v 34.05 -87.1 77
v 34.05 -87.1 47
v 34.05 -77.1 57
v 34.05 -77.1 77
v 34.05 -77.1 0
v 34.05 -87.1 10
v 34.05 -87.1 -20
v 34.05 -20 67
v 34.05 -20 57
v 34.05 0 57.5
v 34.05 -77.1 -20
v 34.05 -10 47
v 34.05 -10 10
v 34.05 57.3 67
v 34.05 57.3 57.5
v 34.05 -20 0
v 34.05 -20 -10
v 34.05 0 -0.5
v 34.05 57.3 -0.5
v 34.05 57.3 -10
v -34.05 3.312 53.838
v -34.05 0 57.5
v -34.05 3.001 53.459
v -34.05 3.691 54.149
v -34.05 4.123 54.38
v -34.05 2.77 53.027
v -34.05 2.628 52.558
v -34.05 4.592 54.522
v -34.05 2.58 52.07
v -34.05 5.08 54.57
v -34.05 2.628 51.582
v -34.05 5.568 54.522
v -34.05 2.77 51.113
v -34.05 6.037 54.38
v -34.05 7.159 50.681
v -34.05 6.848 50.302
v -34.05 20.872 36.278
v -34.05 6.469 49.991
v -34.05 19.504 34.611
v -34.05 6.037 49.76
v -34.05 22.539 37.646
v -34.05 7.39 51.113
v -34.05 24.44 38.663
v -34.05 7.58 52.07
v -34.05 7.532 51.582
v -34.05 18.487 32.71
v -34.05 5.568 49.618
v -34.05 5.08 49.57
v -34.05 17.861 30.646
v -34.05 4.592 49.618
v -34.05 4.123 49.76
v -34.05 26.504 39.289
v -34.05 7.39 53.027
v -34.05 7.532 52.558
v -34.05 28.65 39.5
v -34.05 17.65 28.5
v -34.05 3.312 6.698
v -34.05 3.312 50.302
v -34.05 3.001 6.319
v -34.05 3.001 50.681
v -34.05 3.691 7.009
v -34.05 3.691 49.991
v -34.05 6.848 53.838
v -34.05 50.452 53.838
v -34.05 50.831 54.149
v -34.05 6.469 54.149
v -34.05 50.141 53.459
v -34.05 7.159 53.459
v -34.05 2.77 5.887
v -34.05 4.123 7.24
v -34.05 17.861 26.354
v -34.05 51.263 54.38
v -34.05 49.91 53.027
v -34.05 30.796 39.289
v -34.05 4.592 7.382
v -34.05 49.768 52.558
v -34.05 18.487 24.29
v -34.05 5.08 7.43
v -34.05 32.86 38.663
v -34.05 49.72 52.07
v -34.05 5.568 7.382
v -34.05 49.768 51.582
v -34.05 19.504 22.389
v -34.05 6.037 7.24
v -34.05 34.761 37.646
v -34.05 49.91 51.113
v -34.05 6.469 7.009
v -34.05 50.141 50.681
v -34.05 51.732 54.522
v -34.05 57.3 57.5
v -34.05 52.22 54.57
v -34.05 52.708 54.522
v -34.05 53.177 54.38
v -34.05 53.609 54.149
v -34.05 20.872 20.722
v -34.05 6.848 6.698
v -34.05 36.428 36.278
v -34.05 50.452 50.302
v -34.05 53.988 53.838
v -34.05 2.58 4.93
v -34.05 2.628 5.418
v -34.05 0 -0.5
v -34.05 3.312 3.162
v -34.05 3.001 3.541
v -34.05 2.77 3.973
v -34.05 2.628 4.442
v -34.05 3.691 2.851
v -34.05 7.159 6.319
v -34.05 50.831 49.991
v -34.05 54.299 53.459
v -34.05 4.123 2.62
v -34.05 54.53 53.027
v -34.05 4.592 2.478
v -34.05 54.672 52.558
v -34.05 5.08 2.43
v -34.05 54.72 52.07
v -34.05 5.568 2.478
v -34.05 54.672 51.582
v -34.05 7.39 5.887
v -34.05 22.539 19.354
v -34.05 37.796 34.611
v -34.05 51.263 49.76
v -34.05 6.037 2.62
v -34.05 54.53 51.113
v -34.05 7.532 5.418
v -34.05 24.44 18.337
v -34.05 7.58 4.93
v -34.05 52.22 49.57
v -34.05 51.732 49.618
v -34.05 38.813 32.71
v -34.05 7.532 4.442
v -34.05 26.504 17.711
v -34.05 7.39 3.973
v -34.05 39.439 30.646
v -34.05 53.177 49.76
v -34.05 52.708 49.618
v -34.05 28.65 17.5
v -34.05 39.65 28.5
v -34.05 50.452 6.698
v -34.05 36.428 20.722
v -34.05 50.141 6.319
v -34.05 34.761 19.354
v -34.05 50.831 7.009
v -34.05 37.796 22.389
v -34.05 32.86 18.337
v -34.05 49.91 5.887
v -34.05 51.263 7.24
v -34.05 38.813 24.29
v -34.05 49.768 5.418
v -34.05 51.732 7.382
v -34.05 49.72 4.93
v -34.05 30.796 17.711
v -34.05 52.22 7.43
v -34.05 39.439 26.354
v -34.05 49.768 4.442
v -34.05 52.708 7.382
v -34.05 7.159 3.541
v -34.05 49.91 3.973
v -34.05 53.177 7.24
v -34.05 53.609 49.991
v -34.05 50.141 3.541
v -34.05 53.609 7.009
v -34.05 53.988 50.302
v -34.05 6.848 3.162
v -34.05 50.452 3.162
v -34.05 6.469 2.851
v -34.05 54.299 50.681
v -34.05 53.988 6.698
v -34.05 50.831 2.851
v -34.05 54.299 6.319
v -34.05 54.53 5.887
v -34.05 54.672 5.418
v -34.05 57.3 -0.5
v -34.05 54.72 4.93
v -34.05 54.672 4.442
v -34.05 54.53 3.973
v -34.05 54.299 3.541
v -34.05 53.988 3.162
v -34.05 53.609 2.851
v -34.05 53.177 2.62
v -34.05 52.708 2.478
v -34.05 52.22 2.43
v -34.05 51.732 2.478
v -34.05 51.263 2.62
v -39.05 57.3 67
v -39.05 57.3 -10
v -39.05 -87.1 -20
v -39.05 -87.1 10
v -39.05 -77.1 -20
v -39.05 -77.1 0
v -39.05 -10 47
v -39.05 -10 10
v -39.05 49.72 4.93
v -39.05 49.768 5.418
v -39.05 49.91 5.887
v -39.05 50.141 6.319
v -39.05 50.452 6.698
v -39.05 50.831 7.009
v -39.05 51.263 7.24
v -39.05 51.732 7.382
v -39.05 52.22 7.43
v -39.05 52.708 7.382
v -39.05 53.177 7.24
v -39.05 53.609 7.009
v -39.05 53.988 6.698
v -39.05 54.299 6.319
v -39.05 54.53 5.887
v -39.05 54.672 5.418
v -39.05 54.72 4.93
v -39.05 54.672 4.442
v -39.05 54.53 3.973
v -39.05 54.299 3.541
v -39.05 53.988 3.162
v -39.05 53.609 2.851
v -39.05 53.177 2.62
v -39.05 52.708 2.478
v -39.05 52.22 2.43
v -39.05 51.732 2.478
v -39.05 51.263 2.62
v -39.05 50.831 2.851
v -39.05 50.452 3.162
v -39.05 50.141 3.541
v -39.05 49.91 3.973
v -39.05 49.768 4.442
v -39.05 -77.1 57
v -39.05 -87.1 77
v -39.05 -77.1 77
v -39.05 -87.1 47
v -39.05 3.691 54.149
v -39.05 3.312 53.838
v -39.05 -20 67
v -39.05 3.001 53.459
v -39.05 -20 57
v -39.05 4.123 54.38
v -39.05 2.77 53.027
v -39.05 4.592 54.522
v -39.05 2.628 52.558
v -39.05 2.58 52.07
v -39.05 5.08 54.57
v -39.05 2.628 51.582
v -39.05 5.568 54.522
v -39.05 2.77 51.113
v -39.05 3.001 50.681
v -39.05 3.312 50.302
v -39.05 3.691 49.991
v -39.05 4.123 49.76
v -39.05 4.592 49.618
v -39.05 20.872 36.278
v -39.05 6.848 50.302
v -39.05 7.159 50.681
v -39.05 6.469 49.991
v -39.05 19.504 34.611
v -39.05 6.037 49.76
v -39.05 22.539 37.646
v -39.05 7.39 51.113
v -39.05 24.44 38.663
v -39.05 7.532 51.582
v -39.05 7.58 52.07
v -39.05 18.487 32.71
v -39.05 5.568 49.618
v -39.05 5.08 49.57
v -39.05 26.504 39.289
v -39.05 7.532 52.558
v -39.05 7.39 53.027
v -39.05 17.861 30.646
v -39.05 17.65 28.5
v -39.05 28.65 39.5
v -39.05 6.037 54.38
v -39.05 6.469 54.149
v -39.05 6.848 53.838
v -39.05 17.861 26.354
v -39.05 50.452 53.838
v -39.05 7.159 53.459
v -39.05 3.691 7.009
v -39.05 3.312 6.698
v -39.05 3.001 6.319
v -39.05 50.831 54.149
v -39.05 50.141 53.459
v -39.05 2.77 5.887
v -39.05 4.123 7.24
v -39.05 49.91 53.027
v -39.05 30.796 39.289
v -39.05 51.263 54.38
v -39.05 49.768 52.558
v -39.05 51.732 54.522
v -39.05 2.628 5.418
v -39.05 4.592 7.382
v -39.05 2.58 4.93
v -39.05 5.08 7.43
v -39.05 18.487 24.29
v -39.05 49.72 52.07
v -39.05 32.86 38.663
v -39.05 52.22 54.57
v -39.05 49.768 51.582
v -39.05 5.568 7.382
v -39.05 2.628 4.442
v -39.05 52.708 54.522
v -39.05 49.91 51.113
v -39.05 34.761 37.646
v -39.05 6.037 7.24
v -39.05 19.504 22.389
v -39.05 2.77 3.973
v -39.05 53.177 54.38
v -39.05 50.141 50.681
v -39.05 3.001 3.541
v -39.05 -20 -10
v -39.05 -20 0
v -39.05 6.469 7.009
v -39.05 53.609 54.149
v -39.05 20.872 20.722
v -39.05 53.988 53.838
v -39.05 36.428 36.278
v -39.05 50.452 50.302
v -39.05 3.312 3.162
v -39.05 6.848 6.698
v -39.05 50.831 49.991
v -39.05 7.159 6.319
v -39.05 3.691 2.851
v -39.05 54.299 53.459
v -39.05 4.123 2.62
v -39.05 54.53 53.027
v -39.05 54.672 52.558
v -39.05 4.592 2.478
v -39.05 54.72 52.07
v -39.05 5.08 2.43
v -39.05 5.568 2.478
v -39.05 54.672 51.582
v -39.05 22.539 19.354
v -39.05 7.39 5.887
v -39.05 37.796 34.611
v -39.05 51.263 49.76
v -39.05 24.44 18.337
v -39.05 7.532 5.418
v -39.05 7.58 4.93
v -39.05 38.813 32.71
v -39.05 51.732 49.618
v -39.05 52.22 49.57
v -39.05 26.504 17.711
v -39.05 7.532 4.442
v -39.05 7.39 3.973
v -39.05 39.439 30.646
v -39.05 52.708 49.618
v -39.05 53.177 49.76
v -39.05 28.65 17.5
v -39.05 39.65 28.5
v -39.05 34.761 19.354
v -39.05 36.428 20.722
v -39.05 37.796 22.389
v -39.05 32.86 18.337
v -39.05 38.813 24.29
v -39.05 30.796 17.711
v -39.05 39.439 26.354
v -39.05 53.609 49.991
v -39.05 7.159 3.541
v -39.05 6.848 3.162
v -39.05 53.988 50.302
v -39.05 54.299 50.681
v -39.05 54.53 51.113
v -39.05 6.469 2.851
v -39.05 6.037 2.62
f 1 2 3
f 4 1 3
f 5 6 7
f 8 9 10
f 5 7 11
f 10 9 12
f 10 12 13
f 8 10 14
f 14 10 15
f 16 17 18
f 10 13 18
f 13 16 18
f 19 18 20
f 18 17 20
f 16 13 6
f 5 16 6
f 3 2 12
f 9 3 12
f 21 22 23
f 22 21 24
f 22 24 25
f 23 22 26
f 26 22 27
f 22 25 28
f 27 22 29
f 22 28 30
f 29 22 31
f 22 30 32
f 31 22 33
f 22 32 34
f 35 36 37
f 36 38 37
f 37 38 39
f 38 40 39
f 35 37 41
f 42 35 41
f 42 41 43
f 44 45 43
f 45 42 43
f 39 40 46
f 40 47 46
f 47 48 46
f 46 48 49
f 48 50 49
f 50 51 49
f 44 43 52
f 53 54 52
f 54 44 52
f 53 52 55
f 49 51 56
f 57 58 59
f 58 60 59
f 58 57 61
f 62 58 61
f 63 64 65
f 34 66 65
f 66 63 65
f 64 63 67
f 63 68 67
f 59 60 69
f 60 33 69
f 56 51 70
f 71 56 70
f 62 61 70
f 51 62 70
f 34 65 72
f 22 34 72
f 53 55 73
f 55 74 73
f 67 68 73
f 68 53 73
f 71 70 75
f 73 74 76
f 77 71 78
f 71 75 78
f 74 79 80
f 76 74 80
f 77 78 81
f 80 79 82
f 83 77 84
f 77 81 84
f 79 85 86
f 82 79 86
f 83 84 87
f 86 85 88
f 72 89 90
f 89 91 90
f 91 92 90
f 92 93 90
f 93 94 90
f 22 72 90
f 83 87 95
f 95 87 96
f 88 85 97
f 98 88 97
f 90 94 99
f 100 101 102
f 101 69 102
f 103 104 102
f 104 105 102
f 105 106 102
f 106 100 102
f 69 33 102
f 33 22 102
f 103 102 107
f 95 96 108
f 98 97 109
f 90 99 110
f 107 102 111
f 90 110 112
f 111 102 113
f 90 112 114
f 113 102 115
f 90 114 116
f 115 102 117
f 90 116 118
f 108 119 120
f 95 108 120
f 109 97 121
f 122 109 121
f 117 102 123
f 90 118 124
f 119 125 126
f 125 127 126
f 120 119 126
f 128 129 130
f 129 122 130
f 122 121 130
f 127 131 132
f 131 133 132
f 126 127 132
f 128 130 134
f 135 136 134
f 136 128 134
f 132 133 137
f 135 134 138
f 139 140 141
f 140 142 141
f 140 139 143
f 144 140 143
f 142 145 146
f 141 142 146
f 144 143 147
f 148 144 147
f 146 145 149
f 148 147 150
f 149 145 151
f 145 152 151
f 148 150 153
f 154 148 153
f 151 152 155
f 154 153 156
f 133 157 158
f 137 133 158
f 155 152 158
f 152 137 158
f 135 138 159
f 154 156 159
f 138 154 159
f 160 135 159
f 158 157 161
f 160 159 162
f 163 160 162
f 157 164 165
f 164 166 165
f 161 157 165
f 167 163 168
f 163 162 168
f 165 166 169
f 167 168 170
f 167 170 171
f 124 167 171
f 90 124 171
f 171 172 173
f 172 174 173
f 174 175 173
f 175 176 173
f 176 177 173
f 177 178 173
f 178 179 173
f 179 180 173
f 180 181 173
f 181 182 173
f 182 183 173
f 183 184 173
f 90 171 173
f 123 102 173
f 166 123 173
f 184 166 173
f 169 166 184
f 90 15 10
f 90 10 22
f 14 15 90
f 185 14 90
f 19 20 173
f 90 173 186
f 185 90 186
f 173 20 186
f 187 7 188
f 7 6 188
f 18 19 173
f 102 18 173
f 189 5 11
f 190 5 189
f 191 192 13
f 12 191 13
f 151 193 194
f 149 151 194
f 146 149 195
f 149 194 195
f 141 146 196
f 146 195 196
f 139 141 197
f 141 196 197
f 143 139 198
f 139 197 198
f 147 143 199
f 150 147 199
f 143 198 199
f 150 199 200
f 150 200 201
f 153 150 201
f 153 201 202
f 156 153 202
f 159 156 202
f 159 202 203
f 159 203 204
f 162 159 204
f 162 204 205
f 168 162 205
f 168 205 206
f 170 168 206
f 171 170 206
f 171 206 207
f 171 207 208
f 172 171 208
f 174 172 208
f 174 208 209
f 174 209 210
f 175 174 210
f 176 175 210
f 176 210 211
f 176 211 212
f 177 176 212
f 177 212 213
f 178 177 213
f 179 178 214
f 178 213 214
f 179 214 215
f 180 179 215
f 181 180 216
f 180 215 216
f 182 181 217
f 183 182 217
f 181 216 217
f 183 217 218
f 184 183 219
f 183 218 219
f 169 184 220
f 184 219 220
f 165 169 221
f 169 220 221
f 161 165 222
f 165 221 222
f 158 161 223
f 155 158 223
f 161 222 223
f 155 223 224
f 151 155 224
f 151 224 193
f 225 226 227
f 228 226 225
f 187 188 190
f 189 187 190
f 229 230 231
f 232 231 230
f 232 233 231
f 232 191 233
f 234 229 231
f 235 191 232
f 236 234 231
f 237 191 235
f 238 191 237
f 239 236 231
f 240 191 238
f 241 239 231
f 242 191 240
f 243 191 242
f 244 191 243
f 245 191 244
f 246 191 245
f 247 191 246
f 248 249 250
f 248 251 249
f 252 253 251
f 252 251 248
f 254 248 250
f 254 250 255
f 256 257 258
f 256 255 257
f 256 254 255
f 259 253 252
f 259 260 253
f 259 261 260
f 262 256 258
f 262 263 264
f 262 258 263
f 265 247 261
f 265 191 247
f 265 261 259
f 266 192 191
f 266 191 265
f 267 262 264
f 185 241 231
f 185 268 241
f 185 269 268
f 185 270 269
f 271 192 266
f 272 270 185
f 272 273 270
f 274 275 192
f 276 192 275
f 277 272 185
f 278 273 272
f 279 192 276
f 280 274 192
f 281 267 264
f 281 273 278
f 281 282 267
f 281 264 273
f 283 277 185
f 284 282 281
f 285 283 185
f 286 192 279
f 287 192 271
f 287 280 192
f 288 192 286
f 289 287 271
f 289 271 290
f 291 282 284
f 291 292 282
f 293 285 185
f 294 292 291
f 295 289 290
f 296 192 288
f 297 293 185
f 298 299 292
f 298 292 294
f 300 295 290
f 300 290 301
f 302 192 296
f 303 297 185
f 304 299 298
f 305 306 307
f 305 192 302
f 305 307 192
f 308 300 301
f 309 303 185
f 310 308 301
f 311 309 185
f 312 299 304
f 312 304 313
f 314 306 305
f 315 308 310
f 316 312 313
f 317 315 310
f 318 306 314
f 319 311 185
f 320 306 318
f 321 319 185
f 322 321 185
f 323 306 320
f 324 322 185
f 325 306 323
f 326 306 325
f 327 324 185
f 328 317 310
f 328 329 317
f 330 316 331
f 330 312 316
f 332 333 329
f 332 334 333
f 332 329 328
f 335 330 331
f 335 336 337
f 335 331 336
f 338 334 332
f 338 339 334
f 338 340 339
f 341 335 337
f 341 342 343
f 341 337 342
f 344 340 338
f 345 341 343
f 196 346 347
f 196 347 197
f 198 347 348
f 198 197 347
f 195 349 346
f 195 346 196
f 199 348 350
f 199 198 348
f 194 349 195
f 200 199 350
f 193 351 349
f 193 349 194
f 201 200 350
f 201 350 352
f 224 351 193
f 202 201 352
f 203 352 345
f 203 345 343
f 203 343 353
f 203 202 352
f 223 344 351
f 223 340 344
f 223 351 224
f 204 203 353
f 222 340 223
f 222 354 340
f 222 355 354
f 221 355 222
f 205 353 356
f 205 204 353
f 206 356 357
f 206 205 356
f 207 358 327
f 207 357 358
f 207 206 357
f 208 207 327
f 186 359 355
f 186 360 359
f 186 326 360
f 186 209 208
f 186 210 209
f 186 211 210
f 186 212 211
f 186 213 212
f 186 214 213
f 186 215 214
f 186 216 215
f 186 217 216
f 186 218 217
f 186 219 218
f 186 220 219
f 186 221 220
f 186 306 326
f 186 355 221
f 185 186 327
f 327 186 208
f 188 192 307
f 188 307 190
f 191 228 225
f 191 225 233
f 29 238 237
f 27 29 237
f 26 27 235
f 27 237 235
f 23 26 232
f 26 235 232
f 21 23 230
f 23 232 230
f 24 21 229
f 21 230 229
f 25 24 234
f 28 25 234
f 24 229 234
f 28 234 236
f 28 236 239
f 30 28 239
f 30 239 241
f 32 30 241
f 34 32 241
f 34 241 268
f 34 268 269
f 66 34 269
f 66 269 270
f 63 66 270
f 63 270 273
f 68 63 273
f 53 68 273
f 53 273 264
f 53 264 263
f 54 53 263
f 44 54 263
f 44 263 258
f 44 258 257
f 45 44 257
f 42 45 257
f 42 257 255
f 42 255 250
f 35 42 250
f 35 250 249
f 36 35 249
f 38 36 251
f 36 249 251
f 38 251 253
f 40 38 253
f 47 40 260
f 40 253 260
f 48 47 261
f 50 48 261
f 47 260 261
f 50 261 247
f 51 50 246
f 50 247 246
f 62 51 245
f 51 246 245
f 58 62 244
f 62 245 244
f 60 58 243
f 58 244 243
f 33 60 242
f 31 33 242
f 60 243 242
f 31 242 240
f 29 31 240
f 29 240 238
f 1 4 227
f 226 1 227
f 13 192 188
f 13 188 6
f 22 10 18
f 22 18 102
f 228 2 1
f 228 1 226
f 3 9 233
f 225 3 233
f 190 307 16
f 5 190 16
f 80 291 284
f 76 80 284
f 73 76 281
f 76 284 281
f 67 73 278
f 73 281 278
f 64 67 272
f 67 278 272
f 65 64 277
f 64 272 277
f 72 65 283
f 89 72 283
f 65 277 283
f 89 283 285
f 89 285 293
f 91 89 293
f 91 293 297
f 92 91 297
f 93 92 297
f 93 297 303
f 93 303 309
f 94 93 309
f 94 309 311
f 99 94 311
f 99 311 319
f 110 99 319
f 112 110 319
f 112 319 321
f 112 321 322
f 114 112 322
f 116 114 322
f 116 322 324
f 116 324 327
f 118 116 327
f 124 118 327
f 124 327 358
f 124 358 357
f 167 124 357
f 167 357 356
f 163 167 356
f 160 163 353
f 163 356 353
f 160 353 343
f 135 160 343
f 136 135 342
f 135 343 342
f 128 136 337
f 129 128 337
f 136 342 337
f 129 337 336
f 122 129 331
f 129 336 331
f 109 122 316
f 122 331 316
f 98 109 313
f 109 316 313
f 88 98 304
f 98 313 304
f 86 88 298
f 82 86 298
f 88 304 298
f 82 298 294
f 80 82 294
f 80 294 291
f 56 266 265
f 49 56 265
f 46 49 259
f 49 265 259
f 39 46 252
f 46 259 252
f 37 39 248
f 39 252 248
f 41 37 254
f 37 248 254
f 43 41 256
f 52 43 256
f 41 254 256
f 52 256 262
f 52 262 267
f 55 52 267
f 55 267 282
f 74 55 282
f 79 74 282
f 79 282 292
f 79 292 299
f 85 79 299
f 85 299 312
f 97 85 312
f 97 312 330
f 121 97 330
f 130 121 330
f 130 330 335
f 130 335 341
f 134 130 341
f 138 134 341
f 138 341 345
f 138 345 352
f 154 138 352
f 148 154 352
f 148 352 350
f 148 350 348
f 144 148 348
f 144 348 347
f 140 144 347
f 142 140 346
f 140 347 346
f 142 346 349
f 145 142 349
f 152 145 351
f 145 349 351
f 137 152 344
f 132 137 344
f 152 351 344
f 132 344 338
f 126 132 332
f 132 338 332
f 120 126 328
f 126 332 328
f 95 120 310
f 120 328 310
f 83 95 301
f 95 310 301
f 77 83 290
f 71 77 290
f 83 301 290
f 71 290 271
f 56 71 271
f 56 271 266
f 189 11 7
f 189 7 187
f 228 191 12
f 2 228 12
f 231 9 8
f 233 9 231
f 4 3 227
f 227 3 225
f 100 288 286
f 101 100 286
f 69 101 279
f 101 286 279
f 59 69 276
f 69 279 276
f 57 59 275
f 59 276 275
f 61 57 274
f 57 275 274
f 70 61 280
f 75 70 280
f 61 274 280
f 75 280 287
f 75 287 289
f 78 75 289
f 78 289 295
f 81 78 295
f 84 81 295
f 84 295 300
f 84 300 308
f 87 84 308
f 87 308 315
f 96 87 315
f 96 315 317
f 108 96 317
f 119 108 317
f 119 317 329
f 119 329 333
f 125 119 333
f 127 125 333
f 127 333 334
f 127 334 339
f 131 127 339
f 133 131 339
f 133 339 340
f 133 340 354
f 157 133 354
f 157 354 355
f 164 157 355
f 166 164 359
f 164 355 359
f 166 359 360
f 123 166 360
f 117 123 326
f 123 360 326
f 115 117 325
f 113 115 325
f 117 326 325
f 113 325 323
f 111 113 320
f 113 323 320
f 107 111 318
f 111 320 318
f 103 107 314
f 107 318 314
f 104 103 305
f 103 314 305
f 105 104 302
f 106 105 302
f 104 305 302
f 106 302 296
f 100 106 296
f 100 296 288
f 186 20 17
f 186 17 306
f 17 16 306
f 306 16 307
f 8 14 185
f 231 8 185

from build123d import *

# Parameters (mm, degrees)
BOSS_EXTRUDE1_DEPTH = 57
SKETCH4_R           = 11
SKETCH4_R_2         = 2.5
CUT_EXTRUDE3_DEPTH  = 43
SKETCH5_W           = 73.1
SKETCH5_H           = 10
BOSS_EXTRUDE2_DEPTH = 77.1
SKETCH6_W           = 73.1
SKETCH6_H           = 10
BOSS_EXTRUDE3_DEPTH = 20
SKETCH8_W           = 73.1
SKETCH8_H           = 77.3
BOSS_EXTRUDE4_DEPTH = 10
SKETCH9_W           = 68.1
SKETCH9_H           = 57.3
CUT_EXTRUDE4_DEPTH  = 0.5


with BuildPart() as part:
    # Sketch1 → Boss-Extrude1 (new body)
    with BuildSketch(Plane.XY):
        Polygon((-34.05, 0), (34.05, 0), (34.05, -10), (29.05, -10), (-34.05, -10), (-39.05, -10), (-39.05, 57.3), (-34.05, 57.3), align=None)
    extrude(amount=BOSS_EXTRUDE1_DEPTH)

    # Sketch4 → Cut-Extrude3 (cut)
    with BuildSketch(Plane.ZY.offset(39.05)):
        with Locations(Location((28.5, 28.65, 0), (0, 0, 270))):
            Circle(SKETCH4_R)
        with Locations(Location((52.07, 52.22, 0), (0, 0, 270))):
            Circle(SKETCH4_R_2)
        with Locations(Location((4.93, 52.22, 0), (0, 0, 270))):
            Circle(SKETCH4_R_2)
        with Locations(Location((52.07, 5.08, 0), (0, 0, 270))):
            Circle(SKETCH4_R_2)
        with Locations(Location((4.93, 5.08, 0), (0, 0, 270))):
            Circle(SKETCH4_R_2)
    extrude(amount=-CUT_EXTRUDE3_DEPTH, mode=Mode.SUBTRACT)

    # Sketch5 → Boss-Extrude2 (add)
    with BuildSketch(Plane.XZ.offset(10)):
        with Locations((-2.5, 5)):
            Rectangle(SKETCH5_W, SKETCH5_H)
        with Locations((-2.5, 52)):
            Rectangle(SKETCH5_W, SKETCH5_H)
    extrude(amount=BOSS_EXTRUDE2_DEPTH)

    # Sketch6 → Boss-Extrude3 (add)
    with BuildSketch(Plane(origin=(0, 0, 0), x_dir=(-1, 0, 0), z_dir=(0, 0, -1))):
        with Locations((2.5, -82.1)):
            Rectangle(SKETCH6_W, SKETCH6_H)
    boss_extrude3 = extrude(amount=BOSS_EXTRUDE3_DEPTH)

    # Sketch8 → Boss-Extrude4 (add)
    with BuildSketch(Plane(origin=(0, 0, 0), x_dir=(-1, 0, 0), z_dir=(0, 0, -1))):
        with Locations((2.5, 18.65)):
            Rectangle(SKETCH8_W, SKETCH8_H)
    boss_extrude4 = extrude(amount=BOSS_EXTRUDE4_DEPTH)

    # Mirror2: Boss-Extrude4 across plane
    add(boss_extrude4.mirror(Plane.XY.offset(28.5)))

    # Mirror3: Boss-Extrude3 across plane
    add(boss_extrude3.mirror(Plane.XY.offset(28.5)))

    # Sketch9 → Cut-Extrude4 (cut)
    with BuildSketch(Plane(origin=(0, 0, 57), x_dir=(-1, 0, 0), z_dir=(0, 0, -1))):
        with Locations((0, 28.65)):
            Rectangle(SKETCH9_W, SKETCH9_H)
    cut_extrude4 = extrude(amount=-CUT_EXTRUDE4_DEPTH, mode=Mode.SUBTRACT)

    # Mirror4: Cut-Extrude4 across plane
    add(cut_extrude4.mirror(Plane.XY.offset(28.5)), mode=Mode.SUBTRACT)


solid = part.part
